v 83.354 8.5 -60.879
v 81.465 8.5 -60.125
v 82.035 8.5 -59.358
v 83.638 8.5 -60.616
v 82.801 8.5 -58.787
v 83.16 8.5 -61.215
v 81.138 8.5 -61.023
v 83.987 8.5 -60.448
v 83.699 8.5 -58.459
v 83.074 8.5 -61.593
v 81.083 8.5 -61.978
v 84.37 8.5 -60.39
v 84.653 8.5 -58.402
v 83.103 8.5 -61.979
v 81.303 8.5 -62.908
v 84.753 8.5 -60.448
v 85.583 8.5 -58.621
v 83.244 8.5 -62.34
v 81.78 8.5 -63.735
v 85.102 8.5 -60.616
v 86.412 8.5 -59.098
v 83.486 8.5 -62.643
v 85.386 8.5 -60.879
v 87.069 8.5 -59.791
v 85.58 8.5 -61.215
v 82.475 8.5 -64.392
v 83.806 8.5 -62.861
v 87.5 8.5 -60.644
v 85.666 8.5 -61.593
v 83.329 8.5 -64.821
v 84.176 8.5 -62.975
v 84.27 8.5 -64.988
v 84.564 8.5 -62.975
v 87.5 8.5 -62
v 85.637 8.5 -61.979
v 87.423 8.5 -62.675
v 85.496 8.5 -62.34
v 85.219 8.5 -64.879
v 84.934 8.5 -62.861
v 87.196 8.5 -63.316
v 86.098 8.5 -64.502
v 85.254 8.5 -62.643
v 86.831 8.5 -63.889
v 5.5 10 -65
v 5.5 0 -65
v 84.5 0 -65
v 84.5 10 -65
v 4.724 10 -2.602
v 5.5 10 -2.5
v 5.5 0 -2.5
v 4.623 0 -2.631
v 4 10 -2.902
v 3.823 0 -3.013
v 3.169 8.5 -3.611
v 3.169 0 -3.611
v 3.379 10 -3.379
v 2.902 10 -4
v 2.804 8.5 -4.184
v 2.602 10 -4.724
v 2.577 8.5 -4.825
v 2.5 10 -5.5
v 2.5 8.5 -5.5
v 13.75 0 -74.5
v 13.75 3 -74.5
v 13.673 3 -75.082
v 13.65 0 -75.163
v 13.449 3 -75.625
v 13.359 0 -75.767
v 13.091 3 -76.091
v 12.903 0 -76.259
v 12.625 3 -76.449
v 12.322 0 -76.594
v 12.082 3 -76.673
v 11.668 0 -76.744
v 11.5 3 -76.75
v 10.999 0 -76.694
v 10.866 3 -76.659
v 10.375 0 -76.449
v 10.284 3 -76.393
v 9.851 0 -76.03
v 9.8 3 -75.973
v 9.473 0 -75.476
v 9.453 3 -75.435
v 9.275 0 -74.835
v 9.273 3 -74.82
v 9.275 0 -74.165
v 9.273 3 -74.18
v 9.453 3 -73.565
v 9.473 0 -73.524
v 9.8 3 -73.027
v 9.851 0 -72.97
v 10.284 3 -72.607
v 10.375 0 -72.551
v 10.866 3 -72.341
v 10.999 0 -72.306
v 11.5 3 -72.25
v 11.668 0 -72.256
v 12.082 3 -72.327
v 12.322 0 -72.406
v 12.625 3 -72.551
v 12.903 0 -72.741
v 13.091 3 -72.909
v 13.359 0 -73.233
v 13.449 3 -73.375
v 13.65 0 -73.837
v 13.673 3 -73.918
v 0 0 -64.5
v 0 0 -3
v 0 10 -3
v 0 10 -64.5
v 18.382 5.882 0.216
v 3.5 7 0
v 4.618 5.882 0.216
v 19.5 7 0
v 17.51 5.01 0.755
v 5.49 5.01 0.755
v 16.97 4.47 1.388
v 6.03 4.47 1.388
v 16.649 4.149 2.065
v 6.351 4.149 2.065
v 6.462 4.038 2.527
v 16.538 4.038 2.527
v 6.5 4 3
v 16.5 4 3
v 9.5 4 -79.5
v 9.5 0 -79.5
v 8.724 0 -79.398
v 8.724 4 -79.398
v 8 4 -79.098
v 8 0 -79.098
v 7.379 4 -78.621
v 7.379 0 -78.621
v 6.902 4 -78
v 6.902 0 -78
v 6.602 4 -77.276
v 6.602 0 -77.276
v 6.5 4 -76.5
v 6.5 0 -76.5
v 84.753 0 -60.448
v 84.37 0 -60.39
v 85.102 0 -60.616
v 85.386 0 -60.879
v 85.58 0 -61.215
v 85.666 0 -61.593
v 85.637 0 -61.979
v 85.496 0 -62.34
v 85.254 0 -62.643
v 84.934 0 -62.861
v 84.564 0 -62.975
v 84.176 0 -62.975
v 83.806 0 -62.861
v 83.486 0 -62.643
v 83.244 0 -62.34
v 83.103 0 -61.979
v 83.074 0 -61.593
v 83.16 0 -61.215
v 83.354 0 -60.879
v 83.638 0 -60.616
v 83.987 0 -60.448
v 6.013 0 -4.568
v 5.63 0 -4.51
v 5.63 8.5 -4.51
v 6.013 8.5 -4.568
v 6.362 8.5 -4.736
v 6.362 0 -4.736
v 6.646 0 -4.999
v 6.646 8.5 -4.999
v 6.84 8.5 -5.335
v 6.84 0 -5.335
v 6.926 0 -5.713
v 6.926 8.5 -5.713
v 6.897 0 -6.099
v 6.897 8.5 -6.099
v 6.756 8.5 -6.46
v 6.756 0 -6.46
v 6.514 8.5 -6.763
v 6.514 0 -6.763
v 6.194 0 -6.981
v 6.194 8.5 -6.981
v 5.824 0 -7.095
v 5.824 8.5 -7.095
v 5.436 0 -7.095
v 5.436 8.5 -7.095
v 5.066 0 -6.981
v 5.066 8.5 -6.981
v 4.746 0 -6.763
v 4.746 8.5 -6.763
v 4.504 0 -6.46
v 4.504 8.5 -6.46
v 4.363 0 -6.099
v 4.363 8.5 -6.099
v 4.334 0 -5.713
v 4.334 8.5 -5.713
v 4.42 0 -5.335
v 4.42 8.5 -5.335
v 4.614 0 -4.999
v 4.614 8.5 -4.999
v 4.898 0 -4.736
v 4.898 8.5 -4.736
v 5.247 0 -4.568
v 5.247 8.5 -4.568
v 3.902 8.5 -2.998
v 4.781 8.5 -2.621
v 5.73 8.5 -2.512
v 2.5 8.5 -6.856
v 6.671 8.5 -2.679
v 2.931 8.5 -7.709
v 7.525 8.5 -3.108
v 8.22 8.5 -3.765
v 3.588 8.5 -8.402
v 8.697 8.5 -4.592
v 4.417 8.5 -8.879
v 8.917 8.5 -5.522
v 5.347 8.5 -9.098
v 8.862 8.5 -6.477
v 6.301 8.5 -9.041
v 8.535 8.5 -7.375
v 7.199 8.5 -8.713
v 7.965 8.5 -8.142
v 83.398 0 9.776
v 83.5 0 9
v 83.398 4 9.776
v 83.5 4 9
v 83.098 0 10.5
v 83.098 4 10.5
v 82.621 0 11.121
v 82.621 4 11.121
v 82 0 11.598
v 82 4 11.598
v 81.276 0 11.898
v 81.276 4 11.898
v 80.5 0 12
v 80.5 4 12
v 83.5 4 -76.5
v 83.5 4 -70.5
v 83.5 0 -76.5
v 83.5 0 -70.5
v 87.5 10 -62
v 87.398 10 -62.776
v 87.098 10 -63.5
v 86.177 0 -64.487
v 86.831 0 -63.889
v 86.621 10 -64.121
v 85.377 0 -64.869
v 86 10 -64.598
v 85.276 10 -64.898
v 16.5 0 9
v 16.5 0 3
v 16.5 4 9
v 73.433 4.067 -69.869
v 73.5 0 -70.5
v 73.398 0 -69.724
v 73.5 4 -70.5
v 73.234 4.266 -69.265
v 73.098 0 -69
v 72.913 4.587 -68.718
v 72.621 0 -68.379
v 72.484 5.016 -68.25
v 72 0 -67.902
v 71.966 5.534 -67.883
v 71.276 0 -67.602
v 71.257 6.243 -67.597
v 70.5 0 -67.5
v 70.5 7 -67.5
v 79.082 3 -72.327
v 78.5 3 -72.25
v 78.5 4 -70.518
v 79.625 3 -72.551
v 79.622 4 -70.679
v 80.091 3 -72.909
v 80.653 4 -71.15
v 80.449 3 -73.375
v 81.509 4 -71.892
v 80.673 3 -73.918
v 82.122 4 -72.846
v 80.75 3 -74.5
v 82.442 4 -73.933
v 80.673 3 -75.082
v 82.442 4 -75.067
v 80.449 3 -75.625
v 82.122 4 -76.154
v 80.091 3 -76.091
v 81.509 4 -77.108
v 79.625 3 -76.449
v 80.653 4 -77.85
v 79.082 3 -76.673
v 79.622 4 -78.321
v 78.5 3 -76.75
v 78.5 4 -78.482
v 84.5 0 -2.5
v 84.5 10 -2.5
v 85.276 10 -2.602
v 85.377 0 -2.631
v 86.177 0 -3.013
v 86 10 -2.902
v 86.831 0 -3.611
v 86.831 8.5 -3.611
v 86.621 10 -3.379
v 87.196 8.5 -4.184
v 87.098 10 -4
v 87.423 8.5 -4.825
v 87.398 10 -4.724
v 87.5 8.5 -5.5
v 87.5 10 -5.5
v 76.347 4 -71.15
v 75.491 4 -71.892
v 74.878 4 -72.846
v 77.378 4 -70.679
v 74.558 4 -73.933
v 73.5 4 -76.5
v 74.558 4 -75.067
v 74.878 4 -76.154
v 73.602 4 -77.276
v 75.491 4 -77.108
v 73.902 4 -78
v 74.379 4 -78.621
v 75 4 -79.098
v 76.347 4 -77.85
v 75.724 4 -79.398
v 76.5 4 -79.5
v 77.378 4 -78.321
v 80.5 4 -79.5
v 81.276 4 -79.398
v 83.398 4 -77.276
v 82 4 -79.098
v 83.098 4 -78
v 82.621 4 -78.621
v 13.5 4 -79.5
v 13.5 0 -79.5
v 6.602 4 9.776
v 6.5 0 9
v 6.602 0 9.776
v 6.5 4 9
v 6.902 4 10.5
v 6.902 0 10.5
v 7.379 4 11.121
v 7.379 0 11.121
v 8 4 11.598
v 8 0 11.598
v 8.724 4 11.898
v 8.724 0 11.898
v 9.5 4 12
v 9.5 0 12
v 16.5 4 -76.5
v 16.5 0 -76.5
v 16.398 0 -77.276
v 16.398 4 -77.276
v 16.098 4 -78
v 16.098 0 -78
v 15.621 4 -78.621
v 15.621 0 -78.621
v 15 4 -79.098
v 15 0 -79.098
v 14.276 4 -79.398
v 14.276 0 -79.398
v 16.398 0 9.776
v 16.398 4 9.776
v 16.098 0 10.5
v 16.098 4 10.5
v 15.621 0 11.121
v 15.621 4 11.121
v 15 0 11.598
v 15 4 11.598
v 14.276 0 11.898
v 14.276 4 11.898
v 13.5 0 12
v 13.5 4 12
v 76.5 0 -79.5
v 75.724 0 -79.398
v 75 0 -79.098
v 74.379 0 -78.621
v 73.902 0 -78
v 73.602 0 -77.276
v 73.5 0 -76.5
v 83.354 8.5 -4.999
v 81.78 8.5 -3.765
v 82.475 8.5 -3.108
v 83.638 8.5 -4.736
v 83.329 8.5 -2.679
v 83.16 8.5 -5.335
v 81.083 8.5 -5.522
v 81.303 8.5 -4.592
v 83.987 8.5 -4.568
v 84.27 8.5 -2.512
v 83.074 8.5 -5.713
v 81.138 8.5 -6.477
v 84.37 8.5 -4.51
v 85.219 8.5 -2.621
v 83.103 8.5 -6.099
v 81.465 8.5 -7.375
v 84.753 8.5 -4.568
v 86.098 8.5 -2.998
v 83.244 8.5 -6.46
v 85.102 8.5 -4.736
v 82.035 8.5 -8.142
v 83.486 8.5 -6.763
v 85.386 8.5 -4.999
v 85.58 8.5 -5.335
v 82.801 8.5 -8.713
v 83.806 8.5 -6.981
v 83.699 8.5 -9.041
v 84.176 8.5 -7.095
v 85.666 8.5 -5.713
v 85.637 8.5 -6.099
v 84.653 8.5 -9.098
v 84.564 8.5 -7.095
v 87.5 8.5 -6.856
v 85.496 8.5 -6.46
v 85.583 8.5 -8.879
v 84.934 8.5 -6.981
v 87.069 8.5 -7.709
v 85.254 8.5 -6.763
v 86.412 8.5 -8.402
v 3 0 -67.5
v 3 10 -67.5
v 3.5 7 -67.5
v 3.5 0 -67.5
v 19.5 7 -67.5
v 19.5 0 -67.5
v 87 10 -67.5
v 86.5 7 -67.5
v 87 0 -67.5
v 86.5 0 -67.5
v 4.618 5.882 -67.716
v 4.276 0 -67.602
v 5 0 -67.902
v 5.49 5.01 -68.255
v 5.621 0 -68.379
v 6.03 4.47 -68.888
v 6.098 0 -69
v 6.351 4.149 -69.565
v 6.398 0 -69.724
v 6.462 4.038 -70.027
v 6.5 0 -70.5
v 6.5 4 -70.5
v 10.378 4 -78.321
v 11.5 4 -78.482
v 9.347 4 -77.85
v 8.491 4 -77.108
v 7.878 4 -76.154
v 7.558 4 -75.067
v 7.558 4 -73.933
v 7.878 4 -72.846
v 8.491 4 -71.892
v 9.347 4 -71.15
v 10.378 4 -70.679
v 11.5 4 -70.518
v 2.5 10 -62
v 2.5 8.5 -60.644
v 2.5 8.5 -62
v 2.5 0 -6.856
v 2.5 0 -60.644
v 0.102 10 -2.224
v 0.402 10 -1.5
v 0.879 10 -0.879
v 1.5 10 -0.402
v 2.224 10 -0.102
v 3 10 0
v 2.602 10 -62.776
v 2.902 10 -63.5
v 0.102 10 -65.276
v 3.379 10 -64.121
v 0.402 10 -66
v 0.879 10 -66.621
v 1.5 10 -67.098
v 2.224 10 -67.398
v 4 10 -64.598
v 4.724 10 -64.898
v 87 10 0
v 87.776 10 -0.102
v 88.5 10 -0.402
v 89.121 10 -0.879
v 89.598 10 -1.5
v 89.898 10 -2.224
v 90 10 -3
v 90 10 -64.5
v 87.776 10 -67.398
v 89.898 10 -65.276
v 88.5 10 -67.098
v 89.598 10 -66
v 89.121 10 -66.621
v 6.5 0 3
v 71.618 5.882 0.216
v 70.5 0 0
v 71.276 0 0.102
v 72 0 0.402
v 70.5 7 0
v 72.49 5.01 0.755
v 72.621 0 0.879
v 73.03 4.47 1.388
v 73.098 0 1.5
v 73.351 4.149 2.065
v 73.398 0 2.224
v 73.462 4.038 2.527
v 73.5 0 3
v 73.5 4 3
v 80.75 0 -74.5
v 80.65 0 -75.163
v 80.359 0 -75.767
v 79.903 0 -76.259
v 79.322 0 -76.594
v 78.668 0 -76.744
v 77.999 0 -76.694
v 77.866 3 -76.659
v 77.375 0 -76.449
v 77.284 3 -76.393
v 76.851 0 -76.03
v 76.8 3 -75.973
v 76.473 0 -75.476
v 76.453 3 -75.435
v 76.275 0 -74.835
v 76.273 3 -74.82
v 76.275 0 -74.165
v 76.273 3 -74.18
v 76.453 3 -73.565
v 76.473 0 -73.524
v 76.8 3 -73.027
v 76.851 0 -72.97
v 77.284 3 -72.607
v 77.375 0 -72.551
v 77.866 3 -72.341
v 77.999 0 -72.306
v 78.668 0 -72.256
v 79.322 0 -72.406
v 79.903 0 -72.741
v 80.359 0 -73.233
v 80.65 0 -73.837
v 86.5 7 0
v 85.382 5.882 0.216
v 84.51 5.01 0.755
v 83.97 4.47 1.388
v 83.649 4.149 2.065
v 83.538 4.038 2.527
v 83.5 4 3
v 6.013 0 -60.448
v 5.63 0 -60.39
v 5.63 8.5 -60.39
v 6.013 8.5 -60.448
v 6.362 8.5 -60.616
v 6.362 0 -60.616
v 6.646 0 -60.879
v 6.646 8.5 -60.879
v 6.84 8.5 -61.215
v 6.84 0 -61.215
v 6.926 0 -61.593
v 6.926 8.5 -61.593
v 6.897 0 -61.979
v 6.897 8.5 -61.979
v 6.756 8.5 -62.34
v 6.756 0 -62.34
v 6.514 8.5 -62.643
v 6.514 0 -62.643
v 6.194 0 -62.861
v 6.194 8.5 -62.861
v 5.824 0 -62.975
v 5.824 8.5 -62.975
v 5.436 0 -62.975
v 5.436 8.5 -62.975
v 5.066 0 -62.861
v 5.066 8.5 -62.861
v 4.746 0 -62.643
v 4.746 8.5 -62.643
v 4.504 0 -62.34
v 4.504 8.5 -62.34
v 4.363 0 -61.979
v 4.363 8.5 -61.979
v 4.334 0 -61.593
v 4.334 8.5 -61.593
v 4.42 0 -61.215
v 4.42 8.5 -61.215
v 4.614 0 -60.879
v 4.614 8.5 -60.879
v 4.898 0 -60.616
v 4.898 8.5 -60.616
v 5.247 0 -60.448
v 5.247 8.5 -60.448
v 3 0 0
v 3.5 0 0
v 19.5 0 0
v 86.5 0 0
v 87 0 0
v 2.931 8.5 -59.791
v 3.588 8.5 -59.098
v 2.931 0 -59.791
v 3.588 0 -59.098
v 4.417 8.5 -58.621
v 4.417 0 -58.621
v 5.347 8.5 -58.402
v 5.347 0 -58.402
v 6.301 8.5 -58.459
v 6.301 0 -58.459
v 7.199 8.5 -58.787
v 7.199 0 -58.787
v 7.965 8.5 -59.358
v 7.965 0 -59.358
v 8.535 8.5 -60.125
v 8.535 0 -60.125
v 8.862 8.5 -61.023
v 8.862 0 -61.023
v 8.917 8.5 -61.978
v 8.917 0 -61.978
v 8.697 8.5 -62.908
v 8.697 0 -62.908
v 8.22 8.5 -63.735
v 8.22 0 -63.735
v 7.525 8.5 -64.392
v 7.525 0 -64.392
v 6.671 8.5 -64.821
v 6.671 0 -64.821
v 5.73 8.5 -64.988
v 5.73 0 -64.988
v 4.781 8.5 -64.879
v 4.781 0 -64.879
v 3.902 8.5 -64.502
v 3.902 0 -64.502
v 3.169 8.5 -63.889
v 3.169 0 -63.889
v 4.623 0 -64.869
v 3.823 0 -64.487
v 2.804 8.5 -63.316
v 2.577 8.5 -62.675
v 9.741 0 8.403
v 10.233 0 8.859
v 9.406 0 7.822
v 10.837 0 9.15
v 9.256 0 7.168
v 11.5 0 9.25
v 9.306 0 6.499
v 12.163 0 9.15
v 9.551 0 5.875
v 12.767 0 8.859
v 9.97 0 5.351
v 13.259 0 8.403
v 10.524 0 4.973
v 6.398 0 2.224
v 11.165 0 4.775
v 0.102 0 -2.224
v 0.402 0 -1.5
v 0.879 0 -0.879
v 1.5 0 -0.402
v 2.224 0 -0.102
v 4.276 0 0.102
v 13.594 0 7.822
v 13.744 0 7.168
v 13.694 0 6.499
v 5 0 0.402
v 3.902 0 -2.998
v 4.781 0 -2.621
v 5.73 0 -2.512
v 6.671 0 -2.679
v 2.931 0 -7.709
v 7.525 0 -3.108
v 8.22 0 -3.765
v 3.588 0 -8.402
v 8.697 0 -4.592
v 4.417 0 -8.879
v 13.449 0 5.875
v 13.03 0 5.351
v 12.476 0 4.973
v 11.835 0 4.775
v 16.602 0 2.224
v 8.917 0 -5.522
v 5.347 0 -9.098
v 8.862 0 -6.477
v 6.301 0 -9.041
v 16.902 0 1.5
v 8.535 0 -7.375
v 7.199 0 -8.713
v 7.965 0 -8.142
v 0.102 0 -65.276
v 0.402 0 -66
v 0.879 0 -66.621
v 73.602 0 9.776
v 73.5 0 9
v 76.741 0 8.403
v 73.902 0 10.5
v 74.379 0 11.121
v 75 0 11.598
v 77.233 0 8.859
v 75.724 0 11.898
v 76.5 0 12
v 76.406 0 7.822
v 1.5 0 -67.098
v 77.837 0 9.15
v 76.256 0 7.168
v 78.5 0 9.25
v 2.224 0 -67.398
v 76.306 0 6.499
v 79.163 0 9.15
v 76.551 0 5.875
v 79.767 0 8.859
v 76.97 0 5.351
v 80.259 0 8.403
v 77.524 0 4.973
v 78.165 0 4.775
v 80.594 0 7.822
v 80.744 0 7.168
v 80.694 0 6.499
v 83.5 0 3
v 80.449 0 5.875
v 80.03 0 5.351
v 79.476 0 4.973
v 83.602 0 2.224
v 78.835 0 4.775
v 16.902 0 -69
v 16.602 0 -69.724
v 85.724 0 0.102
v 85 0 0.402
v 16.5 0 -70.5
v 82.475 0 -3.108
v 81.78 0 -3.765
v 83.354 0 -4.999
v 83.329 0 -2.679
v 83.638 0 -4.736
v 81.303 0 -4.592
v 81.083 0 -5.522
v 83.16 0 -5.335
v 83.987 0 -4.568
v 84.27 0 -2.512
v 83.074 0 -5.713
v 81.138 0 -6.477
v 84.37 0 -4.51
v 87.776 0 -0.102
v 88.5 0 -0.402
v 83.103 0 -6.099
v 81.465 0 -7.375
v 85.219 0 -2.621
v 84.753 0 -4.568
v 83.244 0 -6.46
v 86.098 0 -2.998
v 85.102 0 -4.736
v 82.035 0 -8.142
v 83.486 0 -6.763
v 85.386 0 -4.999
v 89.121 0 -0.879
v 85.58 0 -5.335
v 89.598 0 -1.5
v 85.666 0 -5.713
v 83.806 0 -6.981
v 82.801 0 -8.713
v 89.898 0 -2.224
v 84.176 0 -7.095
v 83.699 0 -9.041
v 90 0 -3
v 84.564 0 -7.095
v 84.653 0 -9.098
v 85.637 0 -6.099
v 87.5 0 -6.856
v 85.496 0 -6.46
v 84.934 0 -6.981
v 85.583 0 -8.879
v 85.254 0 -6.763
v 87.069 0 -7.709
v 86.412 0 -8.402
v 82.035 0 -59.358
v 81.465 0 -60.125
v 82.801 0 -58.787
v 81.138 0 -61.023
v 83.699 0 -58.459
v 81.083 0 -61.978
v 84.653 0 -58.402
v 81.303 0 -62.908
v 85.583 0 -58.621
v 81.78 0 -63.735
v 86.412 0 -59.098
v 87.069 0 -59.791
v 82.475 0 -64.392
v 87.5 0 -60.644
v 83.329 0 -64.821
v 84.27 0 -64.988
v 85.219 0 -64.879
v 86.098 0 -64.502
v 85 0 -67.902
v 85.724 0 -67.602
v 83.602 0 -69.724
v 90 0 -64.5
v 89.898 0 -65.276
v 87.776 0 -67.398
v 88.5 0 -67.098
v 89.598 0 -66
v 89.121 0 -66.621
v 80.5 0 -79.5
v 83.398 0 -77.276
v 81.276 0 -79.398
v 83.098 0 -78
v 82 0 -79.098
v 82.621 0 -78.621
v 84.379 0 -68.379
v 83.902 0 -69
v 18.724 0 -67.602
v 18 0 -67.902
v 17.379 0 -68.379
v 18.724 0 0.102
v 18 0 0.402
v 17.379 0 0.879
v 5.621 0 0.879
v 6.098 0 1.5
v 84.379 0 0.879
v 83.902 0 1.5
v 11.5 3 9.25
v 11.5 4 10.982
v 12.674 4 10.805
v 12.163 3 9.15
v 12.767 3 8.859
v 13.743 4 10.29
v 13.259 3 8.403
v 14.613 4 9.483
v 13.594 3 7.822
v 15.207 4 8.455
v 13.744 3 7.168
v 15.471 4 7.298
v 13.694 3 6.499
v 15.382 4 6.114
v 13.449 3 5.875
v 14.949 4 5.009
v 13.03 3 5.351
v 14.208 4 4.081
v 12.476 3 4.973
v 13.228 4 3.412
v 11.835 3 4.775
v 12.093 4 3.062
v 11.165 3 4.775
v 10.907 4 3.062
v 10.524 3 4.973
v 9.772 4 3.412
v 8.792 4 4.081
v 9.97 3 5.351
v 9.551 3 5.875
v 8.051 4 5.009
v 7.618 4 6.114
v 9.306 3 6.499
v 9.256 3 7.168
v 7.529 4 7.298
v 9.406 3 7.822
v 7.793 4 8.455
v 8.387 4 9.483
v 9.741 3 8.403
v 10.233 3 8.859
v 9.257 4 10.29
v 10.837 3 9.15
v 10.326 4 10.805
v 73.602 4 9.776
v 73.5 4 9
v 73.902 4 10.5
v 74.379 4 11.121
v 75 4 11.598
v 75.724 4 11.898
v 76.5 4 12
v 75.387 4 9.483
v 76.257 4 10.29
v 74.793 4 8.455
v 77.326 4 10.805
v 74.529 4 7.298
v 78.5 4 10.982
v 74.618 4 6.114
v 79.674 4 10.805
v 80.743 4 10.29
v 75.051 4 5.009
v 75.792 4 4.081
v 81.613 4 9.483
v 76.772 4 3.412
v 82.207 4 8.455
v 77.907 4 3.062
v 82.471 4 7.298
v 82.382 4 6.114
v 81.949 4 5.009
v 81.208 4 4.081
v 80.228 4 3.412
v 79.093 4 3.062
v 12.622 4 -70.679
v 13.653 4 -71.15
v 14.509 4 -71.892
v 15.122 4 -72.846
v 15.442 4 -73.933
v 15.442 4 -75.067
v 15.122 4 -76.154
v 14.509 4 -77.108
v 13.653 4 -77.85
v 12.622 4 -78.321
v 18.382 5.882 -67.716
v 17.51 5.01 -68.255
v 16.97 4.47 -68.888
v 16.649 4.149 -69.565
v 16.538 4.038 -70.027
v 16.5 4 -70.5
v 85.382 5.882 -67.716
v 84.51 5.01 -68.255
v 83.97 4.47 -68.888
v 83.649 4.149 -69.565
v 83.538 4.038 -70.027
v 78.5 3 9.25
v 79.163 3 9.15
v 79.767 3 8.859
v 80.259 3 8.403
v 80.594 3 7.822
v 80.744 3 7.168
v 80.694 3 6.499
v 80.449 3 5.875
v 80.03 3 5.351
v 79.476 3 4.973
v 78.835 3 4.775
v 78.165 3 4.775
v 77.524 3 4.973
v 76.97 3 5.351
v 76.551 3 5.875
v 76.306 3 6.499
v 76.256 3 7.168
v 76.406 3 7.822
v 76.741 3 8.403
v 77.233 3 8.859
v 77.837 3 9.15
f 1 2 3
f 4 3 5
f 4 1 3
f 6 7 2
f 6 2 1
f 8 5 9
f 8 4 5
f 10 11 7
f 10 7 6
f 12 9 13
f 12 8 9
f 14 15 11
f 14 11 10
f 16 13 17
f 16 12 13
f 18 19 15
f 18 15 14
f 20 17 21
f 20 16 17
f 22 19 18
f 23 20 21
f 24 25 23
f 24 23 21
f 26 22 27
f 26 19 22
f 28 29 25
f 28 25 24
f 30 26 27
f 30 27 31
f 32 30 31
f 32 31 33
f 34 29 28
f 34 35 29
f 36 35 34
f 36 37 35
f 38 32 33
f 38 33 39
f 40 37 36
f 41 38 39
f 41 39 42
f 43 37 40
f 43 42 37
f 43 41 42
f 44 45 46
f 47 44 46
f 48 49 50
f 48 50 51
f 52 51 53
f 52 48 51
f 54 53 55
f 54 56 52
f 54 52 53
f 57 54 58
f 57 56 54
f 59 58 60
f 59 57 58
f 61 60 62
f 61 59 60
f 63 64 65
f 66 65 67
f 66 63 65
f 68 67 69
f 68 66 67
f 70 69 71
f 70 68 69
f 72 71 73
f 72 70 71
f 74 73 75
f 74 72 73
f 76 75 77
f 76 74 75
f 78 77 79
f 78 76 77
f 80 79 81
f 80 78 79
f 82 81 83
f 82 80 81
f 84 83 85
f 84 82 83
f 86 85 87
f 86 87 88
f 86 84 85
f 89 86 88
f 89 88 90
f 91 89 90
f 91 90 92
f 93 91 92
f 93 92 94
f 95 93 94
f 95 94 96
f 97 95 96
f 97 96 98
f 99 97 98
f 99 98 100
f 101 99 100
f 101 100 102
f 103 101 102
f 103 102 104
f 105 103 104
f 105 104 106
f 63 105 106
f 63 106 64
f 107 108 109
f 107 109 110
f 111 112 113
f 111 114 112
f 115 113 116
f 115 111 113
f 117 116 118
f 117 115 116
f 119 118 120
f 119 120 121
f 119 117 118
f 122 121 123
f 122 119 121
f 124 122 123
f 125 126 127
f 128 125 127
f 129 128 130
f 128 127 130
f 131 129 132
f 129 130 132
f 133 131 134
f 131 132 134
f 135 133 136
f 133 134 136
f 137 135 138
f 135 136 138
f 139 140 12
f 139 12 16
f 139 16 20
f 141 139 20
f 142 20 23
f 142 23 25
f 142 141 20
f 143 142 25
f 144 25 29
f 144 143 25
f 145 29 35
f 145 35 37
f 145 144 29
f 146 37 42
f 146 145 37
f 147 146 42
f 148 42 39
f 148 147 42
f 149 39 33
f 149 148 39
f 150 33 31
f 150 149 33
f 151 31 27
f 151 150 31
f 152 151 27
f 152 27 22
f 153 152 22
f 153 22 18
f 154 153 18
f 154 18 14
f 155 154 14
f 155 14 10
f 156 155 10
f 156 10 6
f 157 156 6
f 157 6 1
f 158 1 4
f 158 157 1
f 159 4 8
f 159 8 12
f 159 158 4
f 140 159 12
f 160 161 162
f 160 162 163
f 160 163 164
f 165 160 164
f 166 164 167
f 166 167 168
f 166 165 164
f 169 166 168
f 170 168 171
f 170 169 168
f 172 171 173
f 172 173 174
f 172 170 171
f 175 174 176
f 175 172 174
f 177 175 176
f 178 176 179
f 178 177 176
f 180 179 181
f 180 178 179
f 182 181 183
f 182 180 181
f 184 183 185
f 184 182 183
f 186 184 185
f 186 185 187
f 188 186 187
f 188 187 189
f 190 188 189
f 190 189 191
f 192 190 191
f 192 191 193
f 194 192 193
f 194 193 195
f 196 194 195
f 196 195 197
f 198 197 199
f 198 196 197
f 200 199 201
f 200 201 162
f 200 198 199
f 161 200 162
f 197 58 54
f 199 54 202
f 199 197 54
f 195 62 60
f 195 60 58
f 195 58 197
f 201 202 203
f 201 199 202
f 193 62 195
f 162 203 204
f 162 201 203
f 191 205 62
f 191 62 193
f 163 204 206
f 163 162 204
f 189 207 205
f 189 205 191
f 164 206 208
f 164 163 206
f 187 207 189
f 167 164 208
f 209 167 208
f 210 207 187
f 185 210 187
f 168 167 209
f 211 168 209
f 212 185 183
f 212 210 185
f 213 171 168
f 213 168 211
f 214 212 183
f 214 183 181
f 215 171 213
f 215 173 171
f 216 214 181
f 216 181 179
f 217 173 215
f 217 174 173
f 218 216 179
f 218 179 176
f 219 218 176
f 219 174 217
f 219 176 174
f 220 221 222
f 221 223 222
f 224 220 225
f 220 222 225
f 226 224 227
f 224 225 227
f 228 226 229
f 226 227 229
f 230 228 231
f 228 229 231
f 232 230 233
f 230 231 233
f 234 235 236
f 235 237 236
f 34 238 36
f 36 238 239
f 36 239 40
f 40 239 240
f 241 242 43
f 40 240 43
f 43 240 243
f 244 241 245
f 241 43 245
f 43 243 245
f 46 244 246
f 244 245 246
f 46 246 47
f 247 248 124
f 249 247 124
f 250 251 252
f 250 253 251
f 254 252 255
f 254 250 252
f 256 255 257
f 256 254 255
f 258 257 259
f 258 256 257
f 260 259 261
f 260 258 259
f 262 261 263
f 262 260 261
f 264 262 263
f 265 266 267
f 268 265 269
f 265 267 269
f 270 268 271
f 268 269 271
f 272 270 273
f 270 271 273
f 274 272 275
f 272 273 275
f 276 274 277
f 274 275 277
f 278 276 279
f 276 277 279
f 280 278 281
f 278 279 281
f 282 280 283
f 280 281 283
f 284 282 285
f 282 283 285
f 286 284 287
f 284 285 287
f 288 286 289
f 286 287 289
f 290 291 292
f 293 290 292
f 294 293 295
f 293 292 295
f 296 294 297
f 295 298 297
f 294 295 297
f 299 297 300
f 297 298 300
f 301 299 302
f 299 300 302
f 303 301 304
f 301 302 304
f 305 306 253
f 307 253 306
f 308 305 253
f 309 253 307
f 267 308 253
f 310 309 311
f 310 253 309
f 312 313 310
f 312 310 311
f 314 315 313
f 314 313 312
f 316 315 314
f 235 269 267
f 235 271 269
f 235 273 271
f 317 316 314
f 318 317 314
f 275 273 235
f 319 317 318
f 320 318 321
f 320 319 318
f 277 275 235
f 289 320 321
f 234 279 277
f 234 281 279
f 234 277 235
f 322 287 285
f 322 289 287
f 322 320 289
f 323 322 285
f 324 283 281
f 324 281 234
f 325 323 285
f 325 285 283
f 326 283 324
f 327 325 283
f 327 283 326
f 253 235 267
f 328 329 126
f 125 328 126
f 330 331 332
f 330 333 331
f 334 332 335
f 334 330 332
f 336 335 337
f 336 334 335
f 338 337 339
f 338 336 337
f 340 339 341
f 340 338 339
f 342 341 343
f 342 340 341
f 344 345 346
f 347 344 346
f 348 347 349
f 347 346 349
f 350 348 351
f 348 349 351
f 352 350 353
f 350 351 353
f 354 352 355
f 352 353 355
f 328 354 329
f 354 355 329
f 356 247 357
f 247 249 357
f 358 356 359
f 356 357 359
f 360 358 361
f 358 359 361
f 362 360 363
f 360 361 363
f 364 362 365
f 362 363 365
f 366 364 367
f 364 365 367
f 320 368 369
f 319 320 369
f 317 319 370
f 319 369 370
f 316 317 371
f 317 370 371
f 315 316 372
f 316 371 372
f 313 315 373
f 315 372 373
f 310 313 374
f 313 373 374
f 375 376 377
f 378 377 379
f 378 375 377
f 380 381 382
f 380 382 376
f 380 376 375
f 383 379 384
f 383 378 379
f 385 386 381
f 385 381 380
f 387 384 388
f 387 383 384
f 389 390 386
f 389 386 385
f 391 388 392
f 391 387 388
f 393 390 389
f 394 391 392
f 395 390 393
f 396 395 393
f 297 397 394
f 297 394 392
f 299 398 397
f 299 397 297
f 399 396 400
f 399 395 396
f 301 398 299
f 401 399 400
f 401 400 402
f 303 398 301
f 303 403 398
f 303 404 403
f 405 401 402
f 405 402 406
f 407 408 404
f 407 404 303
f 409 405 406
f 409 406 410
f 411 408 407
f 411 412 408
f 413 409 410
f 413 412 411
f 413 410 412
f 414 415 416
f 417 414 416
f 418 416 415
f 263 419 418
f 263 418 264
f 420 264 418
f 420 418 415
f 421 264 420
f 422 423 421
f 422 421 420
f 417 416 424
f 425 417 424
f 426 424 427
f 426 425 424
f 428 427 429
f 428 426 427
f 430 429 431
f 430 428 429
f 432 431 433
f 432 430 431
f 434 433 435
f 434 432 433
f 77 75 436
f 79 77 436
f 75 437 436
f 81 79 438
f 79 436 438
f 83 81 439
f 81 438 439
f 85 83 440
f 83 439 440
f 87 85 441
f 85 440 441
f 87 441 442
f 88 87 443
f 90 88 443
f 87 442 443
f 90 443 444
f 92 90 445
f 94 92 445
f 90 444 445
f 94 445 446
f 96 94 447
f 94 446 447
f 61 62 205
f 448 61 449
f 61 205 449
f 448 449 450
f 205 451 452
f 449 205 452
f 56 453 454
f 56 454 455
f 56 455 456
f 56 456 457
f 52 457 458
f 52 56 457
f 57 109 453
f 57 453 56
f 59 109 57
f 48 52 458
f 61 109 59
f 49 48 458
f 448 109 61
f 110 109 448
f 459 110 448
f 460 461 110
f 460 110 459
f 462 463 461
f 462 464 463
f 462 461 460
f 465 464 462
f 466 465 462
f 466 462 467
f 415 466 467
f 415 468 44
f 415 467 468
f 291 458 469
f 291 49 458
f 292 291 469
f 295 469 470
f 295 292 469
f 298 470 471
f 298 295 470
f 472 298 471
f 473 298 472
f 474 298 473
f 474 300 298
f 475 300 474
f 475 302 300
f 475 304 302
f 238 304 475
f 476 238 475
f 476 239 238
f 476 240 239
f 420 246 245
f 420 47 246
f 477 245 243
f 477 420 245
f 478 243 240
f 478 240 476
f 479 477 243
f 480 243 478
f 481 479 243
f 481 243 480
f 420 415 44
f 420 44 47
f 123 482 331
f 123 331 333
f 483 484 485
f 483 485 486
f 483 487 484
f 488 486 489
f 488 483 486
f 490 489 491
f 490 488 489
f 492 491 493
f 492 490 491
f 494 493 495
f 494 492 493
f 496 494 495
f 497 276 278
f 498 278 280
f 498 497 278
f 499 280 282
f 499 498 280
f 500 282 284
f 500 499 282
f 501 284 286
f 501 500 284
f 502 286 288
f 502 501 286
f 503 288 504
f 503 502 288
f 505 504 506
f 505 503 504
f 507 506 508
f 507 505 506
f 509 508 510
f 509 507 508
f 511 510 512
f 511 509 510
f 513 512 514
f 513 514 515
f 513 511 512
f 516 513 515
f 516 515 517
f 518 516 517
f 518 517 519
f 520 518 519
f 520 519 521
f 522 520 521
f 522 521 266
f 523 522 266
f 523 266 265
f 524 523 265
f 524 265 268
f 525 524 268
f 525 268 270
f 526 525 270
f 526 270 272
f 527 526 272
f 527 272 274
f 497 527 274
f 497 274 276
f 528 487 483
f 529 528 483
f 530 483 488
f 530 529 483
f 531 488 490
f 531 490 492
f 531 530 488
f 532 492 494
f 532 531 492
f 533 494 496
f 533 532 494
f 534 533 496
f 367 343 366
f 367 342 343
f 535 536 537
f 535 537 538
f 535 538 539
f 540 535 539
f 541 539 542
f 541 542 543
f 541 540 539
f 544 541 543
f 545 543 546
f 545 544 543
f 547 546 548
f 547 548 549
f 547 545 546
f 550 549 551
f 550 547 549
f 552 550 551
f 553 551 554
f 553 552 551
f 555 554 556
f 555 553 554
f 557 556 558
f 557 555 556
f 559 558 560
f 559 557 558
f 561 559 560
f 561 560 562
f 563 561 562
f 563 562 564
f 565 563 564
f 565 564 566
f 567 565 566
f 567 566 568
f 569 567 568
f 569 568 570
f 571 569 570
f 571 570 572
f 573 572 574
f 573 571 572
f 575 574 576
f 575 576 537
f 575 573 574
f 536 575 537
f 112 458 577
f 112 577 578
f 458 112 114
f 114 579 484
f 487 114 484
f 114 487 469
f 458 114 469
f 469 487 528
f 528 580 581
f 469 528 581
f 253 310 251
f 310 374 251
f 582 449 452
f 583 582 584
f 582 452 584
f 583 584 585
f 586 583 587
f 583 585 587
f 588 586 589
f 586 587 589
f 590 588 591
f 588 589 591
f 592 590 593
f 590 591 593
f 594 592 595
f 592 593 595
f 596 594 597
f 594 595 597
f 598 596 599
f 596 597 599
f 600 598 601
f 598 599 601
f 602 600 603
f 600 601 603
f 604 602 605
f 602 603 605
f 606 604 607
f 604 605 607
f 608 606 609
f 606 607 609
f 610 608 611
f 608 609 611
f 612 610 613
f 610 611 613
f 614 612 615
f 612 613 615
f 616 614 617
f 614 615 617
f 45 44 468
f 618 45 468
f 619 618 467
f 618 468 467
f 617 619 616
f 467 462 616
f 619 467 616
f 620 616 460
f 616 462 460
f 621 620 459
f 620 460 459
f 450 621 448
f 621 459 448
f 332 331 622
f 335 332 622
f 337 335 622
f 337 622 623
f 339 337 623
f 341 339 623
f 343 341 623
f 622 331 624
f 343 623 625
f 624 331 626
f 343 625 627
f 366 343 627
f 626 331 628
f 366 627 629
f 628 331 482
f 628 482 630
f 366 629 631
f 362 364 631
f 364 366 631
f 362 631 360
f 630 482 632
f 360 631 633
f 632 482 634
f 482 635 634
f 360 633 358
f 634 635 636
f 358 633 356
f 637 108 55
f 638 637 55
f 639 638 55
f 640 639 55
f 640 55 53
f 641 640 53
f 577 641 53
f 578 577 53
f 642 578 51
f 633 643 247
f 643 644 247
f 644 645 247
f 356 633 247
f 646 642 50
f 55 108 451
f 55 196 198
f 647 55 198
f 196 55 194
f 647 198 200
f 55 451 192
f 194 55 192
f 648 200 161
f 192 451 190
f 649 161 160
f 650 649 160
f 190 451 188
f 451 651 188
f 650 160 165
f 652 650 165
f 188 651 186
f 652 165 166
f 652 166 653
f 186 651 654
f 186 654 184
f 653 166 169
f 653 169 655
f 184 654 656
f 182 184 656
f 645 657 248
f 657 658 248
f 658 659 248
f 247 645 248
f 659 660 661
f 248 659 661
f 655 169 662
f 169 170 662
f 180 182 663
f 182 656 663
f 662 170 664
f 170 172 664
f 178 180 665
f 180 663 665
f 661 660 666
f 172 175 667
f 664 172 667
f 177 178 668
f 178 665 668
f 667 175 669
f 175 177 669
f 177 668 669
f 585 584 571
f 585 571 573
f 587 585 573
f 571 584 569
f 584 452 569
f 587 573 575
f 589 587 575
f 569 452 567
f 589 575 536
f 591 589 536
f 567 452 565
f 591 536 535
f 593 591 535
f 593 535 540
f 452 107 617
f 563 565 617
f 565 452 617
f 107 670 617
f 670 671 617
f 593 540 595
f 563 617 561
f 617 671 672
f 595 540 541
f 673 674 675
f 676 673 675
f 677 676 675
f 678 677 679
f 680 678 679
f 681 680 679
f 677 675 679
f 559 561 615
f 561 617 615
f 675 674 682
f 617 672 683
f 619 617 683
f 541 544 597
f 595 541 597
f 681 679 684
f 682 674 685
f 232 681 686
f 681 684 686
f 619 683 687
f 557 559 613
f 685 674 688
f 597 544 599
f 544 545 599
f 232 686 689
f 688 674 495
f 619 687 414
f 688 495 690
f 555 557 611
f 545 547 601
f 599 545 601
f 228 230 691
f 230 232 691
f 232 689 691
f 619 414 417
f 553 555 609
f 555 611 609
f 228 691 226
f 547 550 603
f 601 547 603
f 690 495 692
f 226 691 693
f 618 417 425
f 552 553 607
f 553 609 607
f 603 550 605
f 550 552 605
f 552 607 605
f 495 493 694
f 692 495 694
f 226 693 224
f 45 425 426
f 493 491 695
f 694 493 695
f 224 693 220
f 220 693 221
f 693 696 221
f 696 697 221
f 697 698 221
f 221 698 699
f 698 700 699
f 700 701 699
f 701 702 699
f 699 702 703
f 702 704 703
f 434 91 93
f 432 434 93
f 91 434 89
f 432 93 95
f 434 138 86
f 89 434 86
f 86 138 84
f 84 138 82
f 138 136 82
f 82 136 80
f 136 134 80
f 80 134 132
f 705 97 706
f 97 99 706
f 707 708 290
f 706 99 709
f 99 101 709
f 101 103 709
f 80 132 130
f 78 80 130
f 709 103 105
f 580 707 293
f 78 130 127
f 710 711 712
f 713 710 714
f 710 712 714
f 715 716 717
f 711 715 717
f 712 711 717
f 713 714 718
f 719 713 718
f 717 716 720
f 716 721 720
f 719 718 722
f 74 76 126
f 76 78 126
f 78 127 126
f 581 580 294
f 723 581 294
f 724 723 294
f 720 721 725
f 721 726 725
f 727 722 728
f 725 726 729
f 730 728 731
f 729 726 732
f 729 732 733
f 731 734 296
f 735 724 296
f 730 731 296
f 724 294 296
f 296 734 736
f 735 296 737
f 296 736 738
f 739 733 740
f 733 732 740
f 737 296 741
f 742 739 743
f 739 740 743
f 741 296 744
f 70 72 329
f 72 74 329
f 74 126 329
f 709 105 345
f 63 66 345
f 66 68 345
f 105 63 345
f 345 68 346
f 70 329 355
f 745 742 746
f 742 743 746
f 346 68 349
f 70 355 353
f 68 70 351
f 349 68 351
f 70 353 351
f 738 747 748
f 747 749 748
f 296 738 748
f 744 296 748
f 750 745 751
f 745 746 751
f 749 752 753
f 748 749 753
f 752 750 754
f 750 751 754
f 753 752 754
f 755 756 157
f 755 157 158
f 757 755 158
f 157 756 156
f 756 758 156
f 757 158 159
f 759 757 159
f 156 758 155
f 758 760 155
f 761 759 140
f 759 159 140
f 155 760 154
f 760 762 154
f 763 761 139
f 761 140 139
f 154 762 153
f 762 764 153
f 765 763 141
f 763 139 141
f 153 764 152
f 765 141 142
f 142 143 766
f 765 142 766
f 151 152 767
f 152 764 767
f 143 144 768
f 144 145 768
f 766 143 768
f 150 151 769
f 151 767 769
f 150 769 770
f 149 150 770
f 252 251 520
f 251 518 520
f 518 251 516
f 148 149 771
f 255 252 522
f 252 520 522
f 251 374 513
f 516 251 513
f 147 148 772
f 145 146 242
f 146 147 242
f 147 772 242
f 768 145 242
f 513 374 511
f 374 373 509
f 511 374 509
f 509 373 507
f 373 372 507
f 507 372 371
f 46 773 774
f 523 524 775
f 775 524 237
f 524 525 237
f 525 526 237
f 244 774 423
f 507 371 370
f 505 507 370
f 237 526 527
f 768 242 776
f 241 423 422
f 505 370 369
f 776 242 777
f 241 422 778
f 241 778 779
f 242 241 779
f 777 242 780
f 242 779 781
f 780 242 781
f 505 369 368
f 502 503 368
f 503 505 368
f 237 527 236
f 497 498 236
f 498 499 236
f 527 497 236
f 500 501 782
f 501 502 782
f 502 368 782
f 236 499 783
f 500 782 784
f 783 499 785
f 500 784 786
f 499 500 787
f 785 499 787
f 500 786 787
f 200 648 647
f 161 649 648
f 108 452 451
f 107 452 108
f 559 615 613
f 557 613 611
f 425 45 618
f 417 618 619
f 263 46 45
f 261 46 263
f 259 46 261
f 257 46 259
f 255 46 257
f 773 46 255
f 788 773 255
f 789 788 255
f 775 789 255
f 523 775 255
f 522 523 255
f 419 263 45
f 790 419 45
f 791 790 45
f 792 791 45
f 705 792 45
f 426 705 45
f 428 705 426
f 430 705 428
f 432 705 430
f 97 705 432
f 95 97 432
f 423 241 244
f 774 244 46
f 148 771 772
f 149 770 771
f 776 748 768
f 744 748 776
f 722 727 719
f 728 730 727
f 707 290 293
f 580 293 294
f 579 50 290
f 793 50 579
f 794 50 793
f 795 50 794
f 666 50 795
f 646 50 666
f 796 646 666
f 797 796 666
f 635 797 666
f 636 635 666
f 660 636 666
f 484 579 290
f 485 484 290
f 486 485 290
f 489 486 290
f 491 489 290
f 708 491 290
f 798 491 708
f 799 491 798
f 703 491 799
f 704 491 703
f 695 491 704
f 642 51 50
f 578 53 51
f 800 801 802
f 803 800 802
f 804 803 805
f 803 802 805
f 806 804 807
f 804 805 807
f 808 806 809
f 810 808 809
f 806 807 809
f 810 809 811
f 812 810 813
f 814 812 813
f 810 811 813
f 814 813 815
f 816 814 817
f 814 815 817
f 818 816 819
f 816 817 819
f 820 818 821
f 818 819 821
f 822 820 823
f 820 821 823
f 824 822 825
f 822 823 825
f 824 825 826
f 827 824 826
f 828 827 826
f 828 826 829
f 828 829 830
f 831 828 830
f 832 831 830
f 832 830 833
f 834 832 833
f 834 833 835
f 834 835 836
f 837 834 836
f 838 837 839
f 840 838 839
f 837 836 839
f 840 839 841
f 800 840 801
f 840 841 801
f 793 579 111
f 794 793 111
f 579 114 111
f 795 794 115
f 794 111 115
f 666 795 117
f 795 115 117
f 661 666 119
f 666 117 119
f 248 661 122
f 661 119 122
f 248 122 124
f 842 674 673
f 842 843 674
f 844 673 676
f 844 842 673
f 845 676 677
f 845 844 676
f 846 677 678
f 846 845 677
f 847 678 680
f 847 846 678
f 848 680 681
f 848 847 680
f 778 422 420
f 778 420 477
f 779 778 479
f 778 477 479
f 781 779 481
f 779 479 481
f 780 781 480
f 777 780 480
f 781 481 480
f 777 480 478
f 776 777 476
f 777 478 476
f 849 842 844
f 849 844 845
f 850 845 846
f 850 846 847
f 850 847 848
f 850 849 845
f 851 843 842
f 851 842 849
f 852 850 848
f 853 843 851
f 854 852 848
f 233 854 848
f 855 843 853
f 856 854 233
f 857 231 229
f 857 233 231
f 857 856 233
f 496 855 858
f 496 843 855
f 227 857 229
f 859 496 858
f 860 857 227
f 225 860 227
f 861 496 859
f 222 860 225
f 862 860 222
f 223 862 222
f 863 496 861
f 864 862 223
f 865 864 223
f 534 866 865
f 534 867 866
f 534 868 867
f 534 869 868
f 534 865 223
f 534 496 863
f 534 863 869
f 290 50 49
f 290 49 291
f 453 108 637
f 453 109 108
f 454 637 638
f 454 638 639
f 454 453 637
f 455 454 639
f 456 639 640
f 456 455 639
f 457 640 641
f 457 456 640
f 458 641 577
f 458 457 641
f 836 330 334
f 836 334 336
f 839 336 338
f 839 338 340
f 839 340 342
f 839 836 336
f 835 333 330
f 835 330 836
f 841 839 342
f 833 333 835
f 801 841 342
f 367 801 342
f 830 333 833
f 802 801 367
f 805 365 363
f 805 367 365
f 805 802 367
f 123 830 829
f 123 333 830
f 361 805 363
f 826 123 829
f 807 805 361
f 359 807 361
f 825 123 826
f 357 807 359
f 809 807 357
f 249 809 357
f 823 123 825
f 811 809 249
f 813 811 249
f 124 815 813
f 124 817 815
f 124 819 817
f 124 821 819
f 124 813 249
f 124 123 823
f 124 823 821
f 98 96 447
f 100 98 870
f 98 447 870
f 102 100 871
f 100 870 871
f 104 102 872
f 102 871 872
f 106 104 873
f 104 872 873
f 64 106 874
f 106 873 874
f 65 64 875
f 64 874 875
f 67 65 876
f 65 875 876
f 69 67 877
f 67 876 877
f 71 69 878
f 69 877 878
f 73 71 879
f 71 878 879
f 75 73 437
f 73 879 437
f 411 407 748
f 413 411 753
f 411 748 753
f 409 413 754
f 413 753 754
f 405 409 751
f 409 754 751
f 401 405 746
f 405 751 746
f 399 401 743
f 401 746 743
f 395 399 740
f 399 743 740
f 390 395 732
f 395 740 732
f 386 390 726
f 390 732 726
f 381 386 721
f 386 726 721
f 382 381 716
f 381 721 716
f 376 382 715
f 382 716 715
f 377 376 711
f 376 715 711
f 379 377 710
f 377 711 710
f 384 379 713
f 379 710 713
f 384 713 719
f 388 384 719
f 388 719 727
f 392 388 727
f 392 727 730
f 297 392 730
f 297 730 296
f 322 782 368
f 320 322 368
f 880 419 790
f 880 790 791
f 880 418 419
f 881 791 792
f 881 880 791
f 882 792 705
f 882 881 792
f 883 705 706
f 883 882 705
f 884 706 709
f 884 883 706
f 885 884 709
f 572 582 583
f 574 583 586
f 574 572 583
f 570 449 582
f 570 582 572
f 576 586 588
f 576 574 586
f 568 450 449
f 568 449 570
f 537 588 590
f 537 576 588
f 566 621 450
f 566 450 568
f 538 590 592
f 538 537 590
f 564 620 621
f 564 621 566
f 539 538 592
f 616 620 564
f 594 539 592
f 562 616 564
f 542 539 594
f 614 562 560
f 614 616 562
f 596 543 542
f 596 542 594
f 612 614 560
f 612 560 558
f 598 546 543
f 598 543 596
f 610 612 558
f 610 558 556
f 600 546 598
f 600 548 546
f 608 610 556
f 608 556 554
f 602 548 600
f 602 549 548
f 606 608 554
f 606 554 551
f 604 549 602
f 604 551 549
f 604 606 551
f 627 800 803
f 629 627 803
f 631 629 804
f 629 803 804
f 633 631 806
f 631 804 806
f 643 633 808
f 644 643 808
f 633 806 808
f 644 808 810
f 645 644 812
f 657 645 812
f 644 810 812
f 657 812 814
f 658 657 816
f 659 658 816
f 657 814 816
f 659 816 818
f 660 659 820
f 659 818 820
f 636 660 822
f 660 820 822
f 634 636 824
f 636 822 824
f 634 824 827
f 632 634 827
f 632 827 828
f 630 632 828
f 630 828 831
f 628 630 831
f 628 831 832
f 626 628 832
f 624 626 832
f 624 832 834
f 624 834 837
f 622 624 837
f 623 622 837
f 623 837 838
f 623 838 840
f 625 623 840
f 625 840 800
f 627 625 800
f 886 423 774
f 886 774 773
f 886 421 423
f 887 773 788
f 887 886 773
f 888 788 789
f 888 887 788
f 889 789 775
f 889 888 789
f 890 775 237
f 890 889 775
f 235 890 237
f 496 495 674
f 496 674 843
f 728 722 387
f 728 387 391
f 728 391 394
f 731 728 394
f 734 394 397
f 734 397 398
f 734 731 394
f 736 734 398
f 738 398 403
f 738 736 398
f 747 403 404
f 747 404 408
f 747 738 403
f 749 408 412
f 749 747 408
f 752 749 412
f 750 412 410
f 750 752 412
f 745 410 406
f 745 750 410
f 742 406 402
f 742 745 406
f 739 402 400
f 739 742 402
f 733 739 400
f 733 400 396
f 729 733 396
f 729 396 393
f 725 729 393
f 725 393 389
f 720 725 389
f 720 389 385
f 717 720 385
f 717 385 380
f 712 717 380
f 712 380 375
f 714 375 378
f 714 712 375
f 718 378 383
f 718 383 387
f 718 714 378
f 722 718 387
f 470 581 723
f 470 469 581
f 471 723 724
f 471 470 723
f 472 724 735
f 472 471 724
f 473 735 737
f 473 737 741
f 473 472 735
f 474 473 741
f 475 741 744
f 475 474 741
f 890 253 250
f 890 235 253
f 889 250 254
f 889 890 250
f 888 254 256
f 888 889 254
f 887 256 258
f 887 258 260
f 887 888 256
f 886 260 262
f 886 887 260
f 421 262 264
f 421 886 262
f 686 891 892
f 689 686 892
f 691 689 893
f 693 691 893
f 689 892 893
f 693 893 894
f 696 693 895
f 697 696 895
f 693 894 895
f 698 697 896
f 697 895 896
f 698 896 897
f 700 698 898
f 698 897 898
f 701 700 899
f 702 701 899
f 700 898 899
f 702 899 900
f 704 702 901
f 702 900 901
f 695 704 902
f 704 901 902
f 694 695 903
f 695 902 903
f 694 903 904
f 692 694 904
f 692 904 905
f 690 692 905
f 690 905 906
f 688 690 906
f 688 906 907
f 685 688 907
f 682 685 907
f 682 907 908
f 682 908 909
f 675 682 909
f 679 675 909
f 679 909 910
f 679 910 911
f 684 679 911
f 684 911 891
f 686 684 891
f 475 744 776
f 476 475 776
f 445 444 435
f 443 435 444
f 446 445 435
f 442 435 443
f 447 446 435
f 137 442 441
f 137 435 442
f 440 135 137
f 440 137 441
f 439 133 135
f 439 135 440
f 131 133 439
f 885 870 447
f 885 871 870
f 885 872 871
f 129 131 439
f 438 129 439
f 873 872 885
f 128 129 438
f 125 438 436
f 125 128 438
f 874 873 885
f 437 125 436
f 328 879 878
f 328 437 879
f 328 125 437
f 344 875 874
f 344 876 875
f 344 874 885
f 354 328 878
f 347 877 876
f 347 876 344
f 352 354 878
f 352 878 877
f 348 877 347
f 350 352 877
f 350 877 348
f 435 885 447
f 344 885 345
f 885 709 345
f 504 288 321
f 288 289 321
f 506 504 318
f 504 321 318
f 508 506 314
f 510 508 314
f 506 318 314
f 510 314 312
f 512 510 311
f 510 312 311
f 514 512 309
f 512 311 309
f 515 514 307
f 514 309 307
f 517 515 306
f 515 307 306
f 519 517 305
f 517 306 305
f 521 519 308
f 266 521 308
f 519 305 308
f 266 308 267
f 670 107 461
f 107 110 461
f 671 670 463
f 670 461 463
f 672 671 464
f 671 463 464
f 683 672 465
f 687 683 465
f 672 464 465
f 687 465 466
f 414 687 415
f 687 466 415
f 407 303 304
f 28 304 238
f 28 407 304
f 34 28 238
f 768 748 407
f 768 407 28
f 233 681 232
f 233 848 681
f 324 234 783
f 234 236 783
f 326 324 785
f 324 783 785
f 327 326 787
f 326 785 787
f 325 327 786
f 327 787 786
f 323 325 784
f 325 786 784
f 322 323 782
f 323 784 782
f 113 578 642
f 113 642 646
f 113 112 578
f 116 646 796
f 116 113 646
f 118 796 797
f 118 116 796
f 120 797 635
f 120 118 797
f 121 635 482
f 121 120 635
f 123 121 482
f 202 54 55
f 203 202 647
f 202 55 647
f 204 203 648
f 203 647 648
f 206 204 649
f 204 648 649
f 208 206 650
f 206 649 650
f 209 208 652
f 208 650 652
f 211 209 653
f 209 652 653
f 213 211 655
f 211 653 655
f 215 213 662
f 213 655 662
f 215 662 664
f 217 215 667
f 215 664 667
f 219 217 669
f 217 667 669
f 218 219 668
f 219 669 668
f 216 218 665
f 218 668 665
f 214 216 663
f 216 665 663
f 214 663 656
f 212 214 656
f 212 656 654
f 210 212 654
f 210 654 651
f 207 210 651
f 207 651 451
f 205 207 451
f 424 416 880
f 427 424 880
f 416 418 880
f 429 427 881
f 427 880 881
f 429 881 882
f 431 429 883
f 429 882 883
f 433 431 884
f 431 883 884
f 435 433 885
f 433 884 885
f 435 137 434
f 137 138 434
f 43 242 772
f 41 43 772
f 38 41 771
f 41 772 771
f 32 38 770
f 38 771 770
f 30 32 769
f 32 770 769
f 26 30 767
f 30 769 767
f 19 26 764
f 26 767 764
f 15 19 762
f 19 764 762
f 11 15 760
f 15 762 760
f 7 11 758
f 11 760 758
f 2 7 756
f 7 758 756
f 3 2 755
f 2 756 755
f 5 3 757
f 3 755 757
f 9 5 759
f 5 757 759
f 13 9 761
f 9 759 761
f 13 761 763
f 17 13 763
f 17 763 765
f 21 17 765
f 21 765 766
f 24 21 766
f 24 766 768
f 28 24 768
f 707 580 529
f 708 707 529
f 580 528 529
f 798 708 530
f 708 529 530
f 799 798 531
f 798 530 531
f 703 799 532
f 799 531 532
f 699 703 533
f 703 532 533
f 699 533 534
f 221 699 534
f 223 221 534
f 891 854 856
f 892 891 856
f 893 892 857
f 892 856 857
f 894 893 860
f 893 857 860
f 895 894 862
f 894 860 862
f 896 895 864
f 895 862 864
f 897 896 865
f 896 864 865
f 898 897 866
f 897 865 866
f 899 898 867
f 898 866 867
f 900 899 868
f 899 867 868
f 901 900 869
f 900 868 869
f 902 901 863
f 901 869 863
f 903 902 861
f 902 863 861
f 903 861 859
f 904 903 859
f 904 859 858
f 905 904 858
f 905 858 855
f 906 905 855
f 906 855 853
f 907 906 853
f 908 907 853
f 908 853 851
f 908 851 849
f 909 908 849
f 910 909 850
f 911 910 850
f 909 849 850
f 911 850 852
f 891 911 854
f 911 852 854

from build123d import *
from OCP.BRepFilletAPI import BRepFilletAPI_MakeChamfer

# Parameters (mm, degrees)
SKETCH5_W             = 90
SKETCH5_H             = 67.5
SKETCH5_W_2           = 85
SKETCH5_H_2           = 62.5
BOSS_EXTRUDE3_DEPTH   = 10
FILLET1_R             = 3
SKETCH7_R             = 3.3
SKETCH7_R_2           = 1.3
BOSS_EXTRUDE5_DEPTH   = 8.5
SKETCH11_W            = 10
SKETCH11_H            = 4
BOSS_EXTRUDE6_DEPTH   = 12
FILLET3_R             = 3
SKETCH13_R            = 2.25
CUT_EXTRUDE1_DEPTH    = 113.659886384
CHAMFER2_SIZE         = 1
CHAMFER2_SIZE2        = 1.732050808
CIRPATTERN1_OUTLINE_R = 2.25
CIRPATTERN1_DEPTH     = 2.9999999
CIRPATTERN1_START     = 2.9999999
CIRPATTERN1_2_DEPTH   = 1.0000001
FILLET5_R             = 3


with BuildPart() as part:
    # Sketch5 → Boss-Extrude3 (new body)
    with BuildSketch(Plane(origin=(0, 0, 0), x_dir=(1, 0, 0), z_dir=(0, 1, 0))):
        with Locations((45, 33.75)):
            Rectangle(SKETCH5_W, SKETCH5_H)
        with Locations((45, 33.75)):
            Rectangle(SKETCH5_W_2, SKETCH5_H_2, mode=Mode.SUBTRACT)
    extrude(amount=BOSS_EXTRUDE3_DEPTH)

    # Fillet1
    fillet1_edges = [part.edges().sort_by_distance(p)[0] for p in [
        (87.5, 5, -2.5),
        (87.5, 5, -65),
        (2.5, 5, -65),
        (2.5, 5, -2.5),
        (90, 5, -67.5),
        (90, 5, 0),
        (0, 5, 0),
        (0, 5, -67.5),
    ]]
    fillet(fillet1_edges, radius=FILLET1_R)

    # Sketch7 → Boss-Extrude5 (add)
    # profile 1 of 4: a face of its own
    with BuildSketch(Plane(origin=(0, 0, 0), x_dir=(1, 0, 0), z_dir=(0, 1, 0))):
        with Locations((5.63, 5.81)):
            Circle(SKETCH7_R)
        with Locations(Location((5.63, 5.81, 0), (0, 0, 270))):
            Circle(SKETCH7_R_2, mode=Mode.SUBTRACT)
    # profile 2 of 4: a face of its own
    with BuildSketch(Plane(origin=(0, 0, 0), x_dir=(1, 0, 0), z_dir=(0, 1, 0))):
        with Locations((5.63, 61.69)):
            Circle(SKETCH7_R)
        with Locations(Location((5.63, 61.69, 0), (0, 0, 270))):
            Circle(SKETCH7_R_2, mode=Mode.SUBTRACT)
    # profile 3 of 4: a face of its own
    with BuildSketch(Plane(origin=(0, 0, 0), x_dir=(1, 0, 0), z_dir=(0, 1, 0))):
        with Locations((84.37, 5.81)):
            Circle(SKETCH7_R)
        with Locations(Location((84.37, 5.81, 0), (0, 0, 270))):
            Circle(SKETCH7_R_2, mode=Mode.SUBTRACT)
    # profile 4 of 4: a face of its own
    with BuildSketch(Plane(origin=(0, 0, 0), x_dir=(1, 0, 0), z_dir=(0, 1, 0))):
        with Locations((84.37, 61.69)):
            Circle(SKETCH7_R)
        with Locations(Location((84.37, 61.69, 0), (0, 0, 270))):
            Circle(SKETCH7_R_2, mode=Mode.SUBTRACT)
    extrude(amount=BOSS_EXTRUDE5_DEPTH)

    # Sketch11 → Boss-Extrude6 (add)
    with BuildSketch(Plane.XY):
        with Locations((11.5, 2)):
            Rectangle(SKETCH11_W, SKETCH11_H)
        with Locations((78.5, 2)):
            Rectangle(SKETCH11_W, SKETCH11_H)
    extrude(amount=BOSS_EXTRUDE6_DEPTH)

    # Fillet3
    fillet3_edges = [part.edges().sort_by_distance(p)[0] for p in [
        (6.5, 2, 0),
        (16.5, 2, 0),
        (11.5, 4, 0),
        (6.5, 2, 12),
        (16.5, 2, 12),
        (73.5, 2, 0),
        (83.5, 2, 0),
        (78.5, 4, 0),
        (73.5, 2, 12),
        (83.5, 2, 12),
    ]]
    fillet(fillet3_edges, radius=FILLET3_R)

    # Sketch13 → Cut-Extrude1 (cut, through all)
    with BuildSketch(Plane(origin=(0, 4, 0), x_dir=(1, 0, 0), z_dir=(0, 1, 0))):
        with Locations(Location((11.5, -7, 0), (0, 0, 270))):
            Circle(SKETCH13_R)
        with Locations(Location((78.5, -7, 0), (0, 0, 270))):
            Circle(SKETCH13_R)
    extrude(amount=-CUT_EXTRUDE1_DEPTH, mode=Mode.SUBTRACT)

    # Chamfer2: one chamfer whose edges measure the first distance from different faces: ONE call of the kernel's chamfer builder (chamfer() names one face for all edges)
    chamfer2_edges_1 = [part.edges().sort_by_distance(p)[0] for p in [
        (11.5, 4, 4.75),
    ]]
    chamfer2_side_1 = [part.faces().sort_by_distance(p)[0] for p in [
        (11.5, 2, 4.75),
    ]]
    chamfer2_edges_2 = [part.edges().sort_by_distance(p)[0] for p in [
        (78.5, 4, 4.75),
    ]]
    chamfer2_side_2 = [part.faces().sort_by_distance(p)[0] for p in [
        (78.5, 2, 4.75),
    ]]
    chamfer2 = BRepFilletAPI_MakeChamfer(part.part.solid().wrapped)
    for e in chamfer2_edges_1:
        chamfer2.Add(CHAMFER2_SIZE, CHAMFER2_SIZE2, e.wrapped, chamfer2_side_1[0].wrapped)  # the first distance lies on this face
    for e in chamfer2_edges_2:
        chamfer2.Add(CHAMFER2_SIZE, CHAMFER2_SIZE2, e.wrapped, chamfer2_side_2[0].wrapped)  # the first distance lies on this face
    add(Compound.cast(chamfer2.Shape()), mode=Mode.REPLACE)

    # CirPattern1: read off the stored shape, not the designer's step
    # CirPattern1 outline → CirPattern1 (add)
    # profile 1 of 2: a face of its own
    with BuildSketch(Plane(origin=(0, 0, 0), x_dir=(1, 0, 0), z_dir=(0, 1, 0))):
        with BuildLine():
            Line((73.5, 76.5), (73.5, 67.5))
            Line((73.5, 67.5), (83.5, 67.5))
            Line((83.5, 67.5), (83.5, 76.5))
            ThreePointArc((83.5, 76.5), (82.621320344, 78.621320344), (80.5, 79.5))
            Line((80.5, 79.5), (76.5, 79.5))
            ThreePointArc((76.5, 79.5), (74.378679656, 78.621320344), (73.5, 76.5))
        make_face()
        with Locations((78.5, 74.5)):
            Circle(CIRPATTERN1_OUTLINE_R, mode=Mode.SUBTRACT)
    # profile 2 of 2: a face of its own
    with BuildSketch(Plane(origin=(0, 0, 0), x_dir=(1, 0, 0), z_dir=(0, 1, 0))):
        with BuildLine():
            Line((6.5, 76.5), (6.5, 67.5))
            Line((6.5, 67.5), (16.5, 67.5))
            Line((16.5, 67.5), (16.5, 76.5))
            ThreePointArc((16.5, 76.5), (15.621320344, 78.621320344), (13.5, 79.5))
            Line((13.5, 79.5), (9.5, 79.5))
            ThreePointArc((9.5, 79.5), (7.378679656, 78.621320344), (6.5, 76.5))
        make_face()
        with Locations((11.5, 74.5)):
            Circle(CIRPATTERN1_OUTLINE_R, mode=Mode.SUBTRACT)
    extrude(amount=CIRPATTERN1_DEPTH)

    # CirPattern1 2 outline → CirPattern1 2 (add)
    with BuildSketch(Plane(origin=(0, 0, 0), x_dir=(1, 0, 0), z_dir=(0, 1, 0)).offset(CIRPATTERN1_START)):
        with BuildLine():
            Line((73.5, 76.5), (73.5, 67.5))
            Line((73.5, 67.5), (83.5, 67.5))
            Line((83.5, 67.5), (83.5, 76.5))
            ThreePointArc((83.5, 76.5), (82.621320344, 78.621320344), (80.5, 79.5))
            Line((80.5, 79.5), (76.5, 79.5))
            ThreePointArc((76.5, 79.5), (74.378679656, 78.621320344), (73.5, 76.5))
        make_face()
        with BuildLine():
            Line((6.5, 76.5), (6.5, 67.5))
            Line((6.5, 67.5), (16.5, 67.5))
            Line((16.5, 67.5), (16.5, 76.5))
            ThreePointArc((16.5, 76.5), (15.621320344, 78.621320344), (13.5, 79.5))
            Line((13.5, 79.5), (9.5, 79.5))
            ThreePointArc((9.5, 79.5), (7.378679656, 78.621320344), (6.5, 76.5))
        make_face()
    extrude(amount=CIRPATTERN1_2_DEPTH)

    # CirPattern1 3: loft between two sections, ruled curve by curve
    cirpattern1_3_from = [
        Edge.make_three_point_arc((11.5, 3, -76.75), (9.25, 3, -74.5), (11.5, 3, -72.25)),
        Edge.make_three_point_arc((11.5, 3, -72.25), (13.75, 3, -74.5), (11.5, 3, -76.75)),
    ]
    cirpattern1_3_to = [
        Edge.make_three_point_arc((11.5, 4, -78.482050808), (7.517949192, 4, -74.5), (11.5, 4, -70.517949192)),
        Edge.make_three_point_arc((11.5, 4, -70.517949192), (15.482050808, 4, -74.5), (11.5, 4, -78.482050808)),
    ]
    cirpattern1_3 = Solid(Shell([*[Face.make_surface_from_curves(cirpattern1_3_from[k], cirpattern1_3_to[k]) for k in range(2)], Face(Wire(cirpattern1_3_from)), Face(Wire(cirpattern1_3_to))]))
    add(cirpattern1_3, mode=Mode.SUBTRACT)

    # CirPattern1 4: loft between two sections, ruled curve by curve
    cirpattern1_4_from = [
        Edge.make_three_point_arc((78.5, 3, -76.75), (76.25, 3, -74.5), (78.5, 3, -72.25)),
        Edge.make_three_point_arc((78.5, 3, -72.25), (80.75, 3, -74.5), (78.5, 3, -76.75)),
    ]
    cirpattern1_4_to = [
        Edge.make_three_point_arc((78.5, 4, -78.482050808), (74.517949192, 4, -74.5), (78.5, 4, -70.517949192)),
        Edge.make_three_point_arc((78.5, 4, -70.517949192), (82.482050808, 4, -74.5), (78.5, 4, -78.482050808)),
    ]
    cirpattern1_4 = Solid(Shell([*[Face.make_surface_from_curves(cirpattern1_4_from[k], cirpattern1_4_to[k]) for k in range(2)], Face(Wire(cirpattern1_4_from)), Face(Wire(cirpattern1_4_to))]))
    add(cirpattern1_4, mode=Mode.SUBTRACT)

    # Fillet5
    fillet5_edges = [part.edges().sort_by_distance(p)[0] for p in [
        (83.5, 2, -67.5),
        (73.5, 2, -67.5),
        (78.5, 4, -67.5),
        (16.5, 2, -67.5),
        (6.5, 2, -67.5),
        (11.5, 4, -67.5),
    ]]
    fillet(fillet5_edges, radius=FILLET5_R)


solid = part.part
